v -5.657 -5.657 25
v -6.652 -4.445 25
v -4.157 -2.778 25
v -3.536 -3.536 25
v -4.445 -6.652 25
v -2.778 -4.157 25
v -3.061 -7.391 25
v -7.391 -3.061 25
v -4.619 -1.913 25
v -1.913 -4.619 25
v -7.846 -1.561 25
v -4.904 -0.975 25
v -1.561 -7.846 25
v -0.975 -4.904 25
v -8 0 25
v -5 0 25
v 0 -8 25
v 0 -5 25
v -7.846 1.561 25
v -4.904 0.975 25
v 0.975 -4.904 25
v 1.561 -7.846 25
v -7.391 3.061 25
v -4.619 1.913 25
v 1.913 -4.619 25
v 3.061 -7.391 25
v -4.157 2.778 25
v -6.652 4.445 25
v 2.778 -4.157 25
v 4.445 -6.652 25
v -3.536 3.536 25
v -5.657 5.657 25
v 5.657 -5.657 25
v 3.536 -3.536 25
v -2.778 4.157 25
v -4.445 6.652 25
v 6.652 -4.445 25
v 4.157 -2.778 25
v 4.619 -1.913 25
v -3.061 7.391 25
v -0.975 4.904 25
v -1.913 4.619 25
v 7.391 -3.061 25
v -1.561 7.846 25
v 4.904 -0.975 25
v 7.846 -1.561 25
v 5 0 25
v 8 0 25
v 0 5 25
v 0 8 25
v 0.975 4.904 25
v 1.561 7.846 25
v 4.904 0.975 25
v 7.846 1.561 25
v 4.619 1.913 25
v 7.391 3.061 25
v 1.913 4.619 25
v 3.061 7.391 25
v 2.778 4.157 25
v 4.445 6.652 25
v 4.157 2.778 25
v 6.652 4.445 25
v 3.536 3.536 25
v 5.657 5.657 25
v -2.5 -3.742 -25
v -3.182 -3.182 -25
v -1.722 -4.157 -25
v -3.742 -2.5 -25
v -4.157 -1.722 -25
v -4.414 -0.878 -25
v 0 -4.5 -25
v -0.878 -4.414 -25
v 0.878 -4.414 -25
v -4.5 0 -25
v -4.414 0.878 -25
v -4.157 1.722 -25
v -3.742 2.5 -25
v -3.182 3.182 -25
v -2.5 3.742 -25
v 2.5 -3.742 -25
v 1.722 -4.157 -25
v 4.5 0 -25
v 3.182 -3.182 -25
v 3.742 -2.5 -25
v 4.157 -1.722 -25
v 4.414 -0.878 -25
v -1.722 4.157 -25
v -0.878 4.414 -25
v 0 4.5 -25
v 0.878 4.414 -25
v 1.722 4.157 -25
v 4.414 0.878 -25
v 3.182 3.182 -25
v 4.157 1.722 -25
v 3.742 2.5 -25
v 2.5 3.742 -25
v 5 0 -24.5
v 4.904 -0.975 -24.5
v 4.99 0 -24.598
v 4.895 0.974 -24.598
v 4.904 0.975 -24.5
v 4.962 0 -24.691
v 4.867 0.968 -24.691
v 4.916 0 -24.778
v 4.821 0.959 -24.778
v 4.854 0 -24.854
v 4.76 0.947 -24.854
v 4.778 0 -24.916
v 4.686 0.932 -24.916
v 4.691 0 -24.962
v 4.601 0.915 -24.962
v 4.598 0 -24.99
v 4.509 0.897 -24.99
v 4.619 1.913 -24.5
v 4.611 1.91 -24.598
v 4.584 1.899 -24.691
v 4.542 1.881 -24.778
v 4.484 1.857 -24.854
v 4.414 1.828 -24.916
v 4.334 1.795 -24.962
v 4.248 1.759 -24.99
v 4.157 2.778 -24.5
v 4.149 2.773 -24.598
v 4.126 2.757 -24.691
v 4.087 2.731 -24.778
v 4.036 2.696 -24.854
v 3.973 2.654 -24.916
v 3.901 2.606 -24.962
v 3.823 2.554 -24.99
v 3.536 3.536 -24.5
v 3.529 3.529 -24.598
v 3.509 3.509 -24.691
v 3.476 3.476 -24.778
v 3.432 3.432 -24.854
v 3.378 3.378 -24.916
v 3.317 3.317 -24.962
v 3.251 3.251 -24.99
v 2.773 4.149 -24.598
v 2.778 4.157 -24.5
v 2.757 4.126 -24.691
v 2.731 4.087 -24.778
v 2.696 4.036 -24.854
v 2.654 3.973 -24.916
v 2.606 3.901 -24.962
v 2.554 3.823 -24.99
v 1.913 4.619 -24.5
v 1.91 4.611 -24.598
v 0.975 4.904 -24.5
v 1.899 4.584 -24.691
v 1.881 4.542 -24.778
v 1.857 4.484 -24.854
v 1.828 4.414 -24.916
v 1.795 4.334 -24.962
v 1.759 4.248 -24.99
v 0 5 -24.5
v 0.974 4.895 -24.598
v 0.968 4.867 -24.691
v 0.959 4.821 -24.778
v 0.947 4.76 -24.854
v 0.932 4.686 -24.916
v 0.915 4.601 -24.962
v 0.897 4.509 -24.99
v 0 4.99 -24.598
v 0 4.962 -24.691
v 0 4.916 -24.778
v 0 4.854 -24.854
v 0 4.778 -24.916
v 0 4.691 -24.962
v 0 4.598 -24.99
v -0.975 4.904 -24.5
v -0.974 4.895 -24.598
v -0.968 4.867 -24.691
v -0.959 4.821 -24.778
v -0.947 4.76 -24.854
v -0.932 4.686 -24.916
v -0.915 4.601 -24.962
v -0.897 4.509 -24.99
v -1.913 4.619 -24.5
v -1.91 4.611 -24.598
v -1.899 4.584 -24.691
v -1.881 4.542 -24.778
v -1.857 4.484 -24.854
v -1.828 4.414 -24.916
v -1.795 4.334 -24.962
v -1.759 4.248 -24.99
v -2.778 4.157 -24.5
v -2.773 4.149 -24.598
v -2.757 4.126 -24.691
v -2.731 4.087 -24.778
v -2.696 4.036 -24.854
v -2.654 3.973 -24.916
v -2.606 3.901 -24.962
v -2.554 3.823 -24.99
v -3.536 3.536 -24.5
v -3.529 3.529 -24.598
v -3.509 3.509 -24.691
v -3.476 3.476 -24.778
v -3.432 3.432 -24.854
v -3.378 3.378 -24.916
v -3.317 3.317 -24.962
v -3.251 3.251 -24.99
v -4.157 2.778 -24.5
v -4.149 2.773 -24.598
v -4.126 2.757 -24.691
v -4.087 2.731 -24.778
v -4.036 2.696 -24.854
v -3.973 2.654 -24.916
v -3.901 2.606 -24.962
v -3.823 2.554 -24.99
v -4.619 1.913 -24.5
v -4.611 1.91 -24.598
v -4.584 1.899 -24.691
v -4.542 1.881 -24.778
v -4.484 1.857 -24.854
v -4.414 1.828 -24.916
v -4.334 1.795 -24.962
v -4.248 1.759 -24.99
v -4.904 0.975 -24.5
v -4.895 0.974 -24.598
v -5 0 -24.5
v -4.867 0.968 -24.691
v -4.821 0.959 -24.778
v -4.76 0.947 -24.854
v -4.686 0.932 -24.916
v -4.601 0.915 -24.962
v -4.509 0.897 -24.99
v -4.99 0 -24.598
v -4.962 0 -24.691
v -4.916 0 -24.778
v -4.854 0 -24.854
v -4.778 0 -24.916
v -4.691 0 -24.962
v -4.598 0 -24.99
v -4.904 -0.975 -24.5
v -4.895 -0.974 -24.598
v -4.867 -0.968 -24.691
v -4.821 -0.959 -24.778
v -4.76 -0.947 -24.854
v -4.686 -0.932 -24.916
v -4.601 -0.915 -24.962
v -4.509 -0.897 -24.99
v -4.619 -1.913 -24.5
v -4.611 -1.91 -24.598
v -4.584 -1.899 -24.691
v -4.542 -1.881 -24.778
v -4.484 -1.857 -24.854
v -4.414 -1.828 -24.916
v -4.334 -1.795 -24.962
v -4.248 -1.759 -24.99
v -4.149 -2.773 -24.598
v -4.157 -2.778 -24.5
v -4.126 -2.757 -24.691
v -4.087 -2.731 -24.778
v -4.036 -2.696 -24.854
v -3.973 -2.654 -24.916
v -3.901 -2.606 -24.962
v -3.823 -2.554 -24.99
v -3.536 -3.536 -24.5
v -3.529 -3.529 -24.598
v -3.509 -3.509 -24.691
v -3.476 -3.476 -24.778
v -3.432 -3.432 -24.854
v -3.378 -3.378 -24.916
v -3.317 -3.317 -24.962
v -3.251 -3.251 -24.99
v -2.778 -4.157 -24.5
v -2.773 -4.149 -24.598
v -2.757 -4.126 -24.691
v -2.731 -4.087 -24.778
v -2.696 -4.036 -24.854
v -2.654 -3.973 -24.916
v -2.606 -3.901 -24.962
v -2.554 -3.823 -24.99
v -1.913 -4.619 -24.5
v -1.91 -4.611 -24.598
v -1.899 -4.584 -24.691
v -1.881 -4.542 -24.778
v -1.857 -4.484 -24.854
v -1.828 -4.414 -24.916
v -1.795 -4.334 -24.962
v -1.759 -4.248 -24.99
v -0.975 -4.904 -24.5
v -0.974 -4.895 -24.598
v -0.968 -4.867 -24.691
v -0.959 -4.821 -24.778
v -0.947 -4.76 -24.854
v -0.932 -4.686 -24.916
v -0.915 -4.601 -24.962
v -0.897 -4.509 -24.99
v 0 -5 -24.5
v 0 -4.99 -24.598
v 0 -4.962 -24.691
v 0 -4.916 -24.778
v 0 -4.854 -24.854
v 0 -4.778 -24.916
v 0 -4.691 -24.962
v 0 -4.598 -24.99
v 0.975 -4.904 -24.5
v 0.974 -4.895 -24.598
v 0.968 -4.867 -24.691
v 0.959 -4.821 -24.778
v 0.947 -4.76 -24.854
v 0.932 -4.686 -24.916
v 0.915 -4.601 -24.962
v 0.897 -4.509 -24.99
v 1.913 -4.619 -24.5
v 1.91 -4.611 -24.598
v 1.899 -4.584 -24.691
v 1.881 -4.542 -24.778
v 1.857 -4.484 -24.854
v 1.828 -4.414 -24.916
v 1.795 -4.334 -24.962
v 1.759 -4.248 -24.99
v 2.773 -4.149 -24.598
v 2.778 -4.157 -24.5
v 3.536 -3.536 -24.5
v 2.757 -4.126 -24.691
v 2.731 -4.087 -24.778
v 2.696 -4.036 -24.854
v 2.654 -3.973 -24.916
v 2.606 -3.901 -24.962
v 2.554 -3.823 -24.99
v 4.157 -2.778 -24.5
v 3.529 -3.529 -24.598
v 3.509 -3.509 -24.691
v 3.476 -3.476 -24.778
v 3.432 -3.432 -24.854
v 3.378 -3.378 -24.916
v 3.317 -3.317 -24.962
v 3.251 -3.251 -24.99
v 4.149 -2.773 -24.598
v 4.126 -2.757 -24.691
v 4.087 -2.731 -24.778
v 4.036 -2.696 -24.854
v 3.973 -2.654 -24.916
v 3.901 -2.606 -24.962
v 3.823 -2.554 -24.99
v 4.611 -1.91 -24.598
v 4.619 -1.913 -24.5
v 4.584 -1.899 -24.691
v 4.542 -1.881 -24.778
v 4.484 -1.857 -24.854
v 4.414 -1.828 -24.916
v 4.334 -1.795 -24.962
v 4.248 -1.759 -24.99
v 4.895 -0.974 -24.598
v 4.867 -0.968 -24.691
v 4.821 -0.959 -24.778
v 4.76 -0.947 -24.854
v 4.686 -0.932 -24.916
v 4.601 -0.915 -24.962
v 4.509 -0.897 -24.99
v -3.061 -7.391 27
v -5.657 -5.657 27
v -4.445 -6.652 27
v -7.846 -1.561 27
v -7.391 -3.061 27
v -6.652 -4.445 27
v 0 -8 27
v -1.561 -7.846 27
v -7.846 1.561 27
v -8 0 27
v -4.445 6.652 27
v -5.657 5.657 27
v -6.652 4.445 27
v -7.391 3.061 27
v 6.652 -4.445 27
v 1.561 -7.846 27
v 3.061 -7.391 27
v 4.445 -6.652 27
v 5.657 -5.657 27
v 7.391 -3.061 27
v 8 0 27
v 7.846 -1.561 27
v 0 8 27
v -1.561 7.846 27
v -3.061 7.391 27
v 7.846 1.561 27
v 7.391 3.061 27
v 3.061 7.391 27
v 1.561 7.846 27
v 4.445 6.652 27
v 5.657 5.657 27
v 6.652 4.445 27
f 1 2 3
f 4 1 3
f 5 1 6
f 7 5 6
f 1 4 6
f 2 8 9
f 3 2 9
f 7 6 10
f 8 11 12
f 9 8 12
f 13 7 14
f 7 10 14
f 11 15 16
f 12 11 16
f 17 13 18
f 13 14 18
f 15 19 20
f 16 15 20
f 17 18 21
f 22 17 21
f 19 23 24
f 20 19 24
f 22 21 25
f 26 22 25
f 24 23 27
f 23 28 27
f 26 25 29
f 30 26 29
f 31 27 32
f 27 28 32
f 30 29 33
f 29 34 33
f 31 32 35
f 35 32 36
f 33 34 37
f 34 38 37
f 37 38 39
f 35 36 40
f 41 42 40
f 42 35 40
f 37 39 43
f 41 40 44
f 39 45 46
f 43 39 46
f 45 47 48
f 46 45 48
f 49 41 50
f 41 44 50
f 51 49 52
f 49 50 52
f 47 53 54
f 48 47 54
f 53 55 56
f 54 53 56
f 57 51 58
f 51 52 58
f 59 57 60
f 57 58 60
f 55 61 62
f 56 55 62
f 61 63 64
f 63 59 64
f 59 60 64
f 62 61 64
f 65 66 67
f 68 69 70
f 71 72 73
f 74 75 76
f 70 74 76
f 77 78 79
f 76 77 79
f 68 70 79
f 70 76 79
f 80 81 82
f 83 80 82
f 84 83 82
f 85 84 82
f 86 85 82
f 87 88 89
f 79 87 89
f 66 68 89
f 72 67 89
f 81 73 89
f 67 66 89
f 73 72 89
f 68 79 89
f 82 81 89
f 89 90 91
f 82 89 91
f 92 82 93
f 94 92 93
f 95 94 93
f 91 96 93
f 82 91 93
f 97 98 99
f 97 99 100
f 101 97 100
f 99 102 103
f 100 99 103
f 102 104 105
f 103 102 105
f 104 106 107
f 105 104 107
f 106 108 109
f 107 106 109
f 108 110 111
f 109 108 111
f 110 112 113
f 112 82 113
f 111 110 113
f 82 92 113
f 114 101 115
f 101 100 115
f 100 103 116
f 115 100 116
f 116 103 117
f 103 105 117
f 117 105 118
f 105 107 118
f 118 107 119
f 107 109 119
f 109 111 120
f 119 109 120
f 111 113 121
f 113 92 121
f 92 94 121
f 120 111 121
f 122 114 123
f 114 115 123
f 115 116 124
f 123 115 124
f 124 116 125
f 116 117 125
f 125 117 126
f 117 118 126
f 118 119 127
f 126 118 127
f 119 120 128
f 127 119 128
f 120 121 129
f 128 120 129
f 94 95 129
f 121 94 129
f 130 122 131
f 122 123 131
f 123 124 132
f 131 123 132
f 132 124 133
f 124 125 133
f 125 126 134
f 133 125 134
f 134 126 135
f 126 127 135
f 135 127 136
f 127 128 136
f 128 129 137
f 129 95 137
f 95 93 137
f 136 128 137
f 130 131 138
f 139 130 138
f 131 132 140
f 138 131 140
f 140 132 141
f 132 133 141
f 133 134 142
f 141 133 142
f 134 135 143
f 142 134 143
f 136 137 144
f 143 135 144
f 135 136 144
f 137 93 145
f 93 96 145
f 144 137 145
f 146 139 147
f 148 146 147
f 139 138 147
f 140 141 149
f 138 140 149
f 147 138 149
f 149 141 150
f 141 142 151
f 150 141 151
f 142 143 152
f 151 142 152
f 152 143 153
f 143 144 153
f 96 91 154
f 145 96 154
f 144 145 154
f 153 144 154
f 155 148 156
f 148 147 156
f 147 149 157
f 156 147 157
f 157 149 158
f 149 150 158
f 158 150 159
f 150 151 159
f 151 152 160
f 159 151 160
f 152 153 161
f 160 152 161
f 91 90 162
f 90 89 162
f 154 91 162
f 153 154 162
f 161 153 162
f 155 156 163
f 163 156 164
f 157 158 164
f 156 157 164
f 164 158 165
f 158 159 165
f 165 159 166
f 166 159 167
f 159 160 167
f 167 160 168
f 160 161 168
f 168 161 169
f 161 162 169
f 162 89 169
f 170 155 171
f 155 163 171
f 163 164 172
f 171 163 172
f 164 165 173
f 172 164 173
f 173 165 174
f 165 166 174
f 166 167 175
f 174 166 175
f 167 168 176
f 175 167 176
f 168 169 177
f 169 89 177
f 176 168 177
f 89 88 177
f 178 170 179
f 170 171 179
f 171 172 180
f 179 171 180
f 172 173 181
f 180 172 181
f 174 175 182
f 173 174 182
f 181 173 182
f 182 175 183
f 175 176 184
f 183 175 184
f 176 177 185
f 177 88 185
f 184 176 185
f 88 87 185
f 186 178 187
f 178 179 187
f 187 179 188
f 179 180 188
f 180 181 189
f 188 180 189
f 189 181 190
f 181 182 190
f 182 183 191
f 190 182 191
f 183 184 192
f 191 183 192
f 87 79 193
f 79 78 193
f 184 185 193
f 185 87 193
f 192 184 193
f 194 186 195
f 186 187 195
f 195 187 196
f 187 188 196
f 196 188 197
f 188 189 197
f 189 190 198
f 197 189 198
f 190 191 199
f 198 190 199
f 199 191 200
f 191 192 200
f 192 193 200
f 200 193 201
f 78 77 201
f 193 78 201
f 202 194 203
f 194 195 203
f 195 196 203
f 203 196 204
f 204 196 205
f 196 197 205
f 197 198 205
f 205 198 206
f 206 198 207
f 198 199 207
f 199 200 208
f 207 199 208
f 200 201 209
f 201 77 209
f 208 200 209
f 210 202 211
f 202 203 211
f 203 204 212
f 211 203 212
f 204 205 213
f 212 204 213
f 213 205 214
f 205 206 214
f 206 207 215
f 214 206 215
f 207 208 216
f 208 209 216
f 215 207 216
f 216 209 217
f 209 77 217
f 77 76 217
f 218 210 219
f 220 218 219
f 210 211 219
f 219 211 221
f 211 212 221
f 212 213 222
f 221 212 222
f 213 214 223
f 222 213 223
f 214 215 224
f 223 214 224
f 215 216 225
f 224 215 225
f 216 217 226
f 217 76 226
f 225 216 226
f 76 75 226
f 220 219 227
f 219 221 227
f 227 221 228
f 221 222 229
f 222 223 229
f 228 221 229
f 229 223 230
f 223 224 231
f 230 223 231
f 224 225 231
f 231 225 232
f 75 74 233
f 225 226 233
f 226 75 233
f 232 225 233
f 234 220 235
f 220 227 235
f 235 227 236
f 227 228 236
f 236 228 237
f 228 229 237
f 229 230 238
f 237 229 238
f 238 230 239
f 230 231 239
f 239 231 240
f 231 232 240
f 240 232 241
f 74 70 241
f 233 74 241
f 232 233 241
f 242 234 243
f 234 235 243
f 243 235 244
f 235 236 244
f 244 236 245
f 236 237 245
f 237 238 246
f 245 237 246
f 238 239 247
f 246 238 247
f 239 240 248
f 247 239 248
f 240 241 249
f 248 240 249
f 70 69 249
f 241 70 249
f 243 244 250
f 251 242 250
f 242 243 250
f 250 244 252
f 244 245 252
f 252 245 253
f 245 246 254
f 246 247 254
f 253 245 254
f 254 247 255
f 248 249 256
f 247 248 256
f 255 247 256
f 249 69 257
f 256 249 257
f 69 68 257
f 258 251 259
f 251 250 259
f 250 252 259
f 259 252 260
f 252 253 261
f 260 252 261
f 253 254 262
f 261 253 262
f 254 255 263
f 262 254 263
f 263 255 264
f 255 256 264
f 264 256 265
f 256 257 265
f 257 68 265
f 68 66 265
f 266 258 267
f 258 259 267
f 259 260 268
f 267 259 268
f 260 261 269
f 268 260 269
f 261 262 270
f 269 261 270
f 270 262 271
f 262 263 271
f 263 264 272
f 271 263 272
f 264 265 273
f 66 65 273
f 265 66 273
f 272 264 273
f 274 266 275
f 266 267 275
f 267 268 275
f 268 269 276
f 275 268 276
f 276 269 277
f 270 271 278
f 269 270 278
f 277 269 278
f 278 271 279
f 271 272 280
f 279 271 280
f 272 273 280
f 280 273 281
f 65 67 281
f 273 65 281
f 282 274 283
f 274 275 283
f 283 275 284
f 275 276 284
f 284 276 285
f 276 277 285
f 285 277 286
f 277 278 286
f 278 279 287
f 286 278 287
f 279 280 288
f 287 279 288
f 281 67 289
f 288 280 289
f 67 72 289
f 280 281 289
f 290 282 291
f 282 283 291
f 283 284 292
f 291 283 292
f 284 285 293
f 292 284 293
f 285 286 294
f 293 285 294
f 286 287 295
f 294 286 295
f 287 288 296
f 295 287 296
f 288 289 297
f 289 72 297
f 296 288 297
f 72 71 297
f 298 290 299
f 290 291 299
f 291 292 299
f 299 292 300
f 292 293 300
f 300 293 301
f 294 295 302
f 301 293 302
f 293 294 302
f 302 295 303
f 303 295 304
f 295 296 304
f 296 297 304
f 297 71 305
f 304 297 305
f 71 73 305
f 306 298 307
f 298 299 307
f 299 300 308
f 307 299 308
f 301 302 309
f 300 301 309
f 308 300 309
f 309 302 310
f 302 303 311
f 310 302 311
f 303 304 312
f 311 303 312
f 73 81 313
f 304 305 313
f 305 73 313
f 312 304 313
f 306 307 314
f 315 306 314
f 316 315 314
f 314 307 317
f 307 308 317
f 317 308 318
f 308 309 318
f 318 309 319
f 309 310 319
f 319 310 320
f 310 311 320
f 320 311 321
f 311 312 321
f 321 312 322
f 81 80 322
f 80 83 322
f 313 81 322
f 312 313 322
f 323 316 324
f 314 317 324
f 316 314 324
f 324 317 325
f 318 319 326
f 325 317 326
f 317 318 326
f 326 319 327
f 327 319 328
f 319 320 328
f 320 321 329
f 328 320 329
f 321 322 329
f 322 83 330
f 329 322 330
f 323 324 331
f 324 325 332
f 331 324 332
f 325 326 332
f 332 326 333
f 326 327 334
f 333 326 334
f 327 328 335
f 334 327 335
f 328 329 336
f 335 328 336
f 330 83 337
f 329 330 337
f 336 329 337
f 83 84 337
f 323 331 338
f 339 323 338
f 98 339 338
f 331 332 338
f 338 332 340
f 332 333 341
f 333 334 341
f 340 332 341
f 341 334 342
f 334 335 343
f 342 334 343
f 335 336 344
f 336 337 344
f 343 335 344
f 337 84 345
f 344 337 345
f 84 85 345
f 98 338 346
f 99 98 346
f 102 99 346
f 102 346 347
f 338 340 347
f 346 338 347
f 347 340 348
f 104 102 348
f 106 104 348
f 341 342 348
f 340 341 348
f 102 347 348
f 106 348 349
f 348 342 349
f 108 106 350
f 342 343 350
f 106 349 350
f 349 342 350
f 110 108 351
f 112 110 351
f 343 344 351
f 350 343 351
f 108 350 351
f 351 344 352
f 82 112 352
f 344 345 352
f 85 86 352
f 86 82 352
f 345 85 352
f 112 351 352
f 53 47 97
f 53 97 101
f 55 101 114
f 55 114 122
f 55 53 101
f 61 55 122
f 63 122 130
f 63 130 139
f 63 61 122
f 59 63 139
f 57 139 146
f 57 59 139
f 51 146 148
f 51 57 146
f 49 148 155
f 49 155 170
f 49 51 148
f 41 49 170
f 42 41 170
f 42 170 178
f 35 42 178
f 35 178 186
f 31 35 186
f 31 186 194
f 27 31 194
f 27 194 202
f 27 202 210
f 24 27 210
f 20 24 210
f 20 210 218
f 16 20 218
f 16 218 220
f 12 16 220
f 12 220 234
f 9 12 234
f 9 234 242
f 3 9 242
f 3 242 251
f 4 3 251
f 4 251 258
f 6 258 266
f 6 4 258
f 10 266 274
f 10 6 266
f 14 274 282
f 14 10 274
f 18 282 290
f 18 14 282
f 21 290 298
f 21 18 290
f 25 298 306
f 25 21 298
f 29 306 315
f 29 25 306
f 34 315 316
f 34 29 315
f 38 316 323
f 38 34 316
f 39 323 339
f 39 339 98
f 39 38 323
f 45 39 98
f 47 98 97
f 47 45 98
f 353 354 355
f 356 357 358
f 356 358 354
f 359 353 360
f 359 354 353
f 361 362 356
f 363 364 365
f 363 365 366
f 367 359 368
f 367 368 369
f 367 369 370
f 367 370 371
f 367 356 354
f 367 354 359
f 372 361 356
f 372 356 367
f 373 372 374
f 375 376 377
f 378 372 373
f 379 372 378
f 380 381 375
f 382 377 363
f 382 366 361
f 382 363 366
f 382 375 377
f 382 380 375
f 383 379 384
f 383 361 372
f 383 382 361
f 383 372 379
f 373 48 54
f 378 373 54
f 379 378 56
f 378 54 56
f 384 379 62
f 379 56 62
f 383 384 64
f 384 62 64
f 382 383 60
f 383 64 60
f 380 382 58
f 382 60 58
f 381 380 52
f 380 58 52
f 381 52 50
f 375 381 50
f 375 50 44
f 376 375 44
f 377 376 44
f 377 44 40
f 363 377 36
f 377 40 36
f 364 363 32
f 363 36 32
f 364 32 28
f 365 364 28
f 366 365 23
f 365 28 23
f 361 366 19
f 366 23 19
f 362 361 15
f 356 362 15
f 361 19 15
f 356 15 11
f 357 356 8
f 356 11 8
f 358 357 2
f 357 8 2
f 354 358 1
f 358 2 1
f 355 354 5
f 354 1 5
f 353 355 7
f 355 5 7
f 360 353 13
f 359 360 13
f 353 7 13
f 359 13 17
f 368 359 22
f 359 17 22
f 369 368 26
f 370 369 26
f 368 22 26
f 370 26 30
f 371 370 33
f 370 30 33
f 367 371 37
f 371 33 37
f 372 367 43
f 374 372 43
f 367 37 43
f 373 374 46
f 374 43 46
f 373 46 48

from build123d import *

# Parameters (mm, degrees)
SKETCH1_R           = 5
BOSS_EXTRUDE1_DEPTH = 25
FILLET3_R           = 0.5
BOSS_EXTRUDE2_START = 25
SKETCH2_R           = 8
BOSS_EXTRUDE2_DEPTH = 2


with BuildPart() as part:
    # Sketch1 → Boss-Extrude1 (new, symmetric)
    with BuildSketch(Plane.XY):
        Circle(SKETCH1_R)
    extrude(amount=BOSS_EXTRUDE1_DEPTH, both=True)

    # Fillet3
    fillet3_edges = [part.edges().sort_by_distance(p)[0] for p in [
        (-5, 0, -25),
    ]]
    fillet(fillet3_edges, radius=FILLET3_R)

    # Sketch2 → Boss-Extrude2 (add)
    with BuildSketch(Plane.XY.offset(BOSS_EXTRUDE2_START)):
        Circle(SKETCH2_R)
    extrude(amount=BOSS_EXTRUDE2_DEPTH)


solid = part.part
